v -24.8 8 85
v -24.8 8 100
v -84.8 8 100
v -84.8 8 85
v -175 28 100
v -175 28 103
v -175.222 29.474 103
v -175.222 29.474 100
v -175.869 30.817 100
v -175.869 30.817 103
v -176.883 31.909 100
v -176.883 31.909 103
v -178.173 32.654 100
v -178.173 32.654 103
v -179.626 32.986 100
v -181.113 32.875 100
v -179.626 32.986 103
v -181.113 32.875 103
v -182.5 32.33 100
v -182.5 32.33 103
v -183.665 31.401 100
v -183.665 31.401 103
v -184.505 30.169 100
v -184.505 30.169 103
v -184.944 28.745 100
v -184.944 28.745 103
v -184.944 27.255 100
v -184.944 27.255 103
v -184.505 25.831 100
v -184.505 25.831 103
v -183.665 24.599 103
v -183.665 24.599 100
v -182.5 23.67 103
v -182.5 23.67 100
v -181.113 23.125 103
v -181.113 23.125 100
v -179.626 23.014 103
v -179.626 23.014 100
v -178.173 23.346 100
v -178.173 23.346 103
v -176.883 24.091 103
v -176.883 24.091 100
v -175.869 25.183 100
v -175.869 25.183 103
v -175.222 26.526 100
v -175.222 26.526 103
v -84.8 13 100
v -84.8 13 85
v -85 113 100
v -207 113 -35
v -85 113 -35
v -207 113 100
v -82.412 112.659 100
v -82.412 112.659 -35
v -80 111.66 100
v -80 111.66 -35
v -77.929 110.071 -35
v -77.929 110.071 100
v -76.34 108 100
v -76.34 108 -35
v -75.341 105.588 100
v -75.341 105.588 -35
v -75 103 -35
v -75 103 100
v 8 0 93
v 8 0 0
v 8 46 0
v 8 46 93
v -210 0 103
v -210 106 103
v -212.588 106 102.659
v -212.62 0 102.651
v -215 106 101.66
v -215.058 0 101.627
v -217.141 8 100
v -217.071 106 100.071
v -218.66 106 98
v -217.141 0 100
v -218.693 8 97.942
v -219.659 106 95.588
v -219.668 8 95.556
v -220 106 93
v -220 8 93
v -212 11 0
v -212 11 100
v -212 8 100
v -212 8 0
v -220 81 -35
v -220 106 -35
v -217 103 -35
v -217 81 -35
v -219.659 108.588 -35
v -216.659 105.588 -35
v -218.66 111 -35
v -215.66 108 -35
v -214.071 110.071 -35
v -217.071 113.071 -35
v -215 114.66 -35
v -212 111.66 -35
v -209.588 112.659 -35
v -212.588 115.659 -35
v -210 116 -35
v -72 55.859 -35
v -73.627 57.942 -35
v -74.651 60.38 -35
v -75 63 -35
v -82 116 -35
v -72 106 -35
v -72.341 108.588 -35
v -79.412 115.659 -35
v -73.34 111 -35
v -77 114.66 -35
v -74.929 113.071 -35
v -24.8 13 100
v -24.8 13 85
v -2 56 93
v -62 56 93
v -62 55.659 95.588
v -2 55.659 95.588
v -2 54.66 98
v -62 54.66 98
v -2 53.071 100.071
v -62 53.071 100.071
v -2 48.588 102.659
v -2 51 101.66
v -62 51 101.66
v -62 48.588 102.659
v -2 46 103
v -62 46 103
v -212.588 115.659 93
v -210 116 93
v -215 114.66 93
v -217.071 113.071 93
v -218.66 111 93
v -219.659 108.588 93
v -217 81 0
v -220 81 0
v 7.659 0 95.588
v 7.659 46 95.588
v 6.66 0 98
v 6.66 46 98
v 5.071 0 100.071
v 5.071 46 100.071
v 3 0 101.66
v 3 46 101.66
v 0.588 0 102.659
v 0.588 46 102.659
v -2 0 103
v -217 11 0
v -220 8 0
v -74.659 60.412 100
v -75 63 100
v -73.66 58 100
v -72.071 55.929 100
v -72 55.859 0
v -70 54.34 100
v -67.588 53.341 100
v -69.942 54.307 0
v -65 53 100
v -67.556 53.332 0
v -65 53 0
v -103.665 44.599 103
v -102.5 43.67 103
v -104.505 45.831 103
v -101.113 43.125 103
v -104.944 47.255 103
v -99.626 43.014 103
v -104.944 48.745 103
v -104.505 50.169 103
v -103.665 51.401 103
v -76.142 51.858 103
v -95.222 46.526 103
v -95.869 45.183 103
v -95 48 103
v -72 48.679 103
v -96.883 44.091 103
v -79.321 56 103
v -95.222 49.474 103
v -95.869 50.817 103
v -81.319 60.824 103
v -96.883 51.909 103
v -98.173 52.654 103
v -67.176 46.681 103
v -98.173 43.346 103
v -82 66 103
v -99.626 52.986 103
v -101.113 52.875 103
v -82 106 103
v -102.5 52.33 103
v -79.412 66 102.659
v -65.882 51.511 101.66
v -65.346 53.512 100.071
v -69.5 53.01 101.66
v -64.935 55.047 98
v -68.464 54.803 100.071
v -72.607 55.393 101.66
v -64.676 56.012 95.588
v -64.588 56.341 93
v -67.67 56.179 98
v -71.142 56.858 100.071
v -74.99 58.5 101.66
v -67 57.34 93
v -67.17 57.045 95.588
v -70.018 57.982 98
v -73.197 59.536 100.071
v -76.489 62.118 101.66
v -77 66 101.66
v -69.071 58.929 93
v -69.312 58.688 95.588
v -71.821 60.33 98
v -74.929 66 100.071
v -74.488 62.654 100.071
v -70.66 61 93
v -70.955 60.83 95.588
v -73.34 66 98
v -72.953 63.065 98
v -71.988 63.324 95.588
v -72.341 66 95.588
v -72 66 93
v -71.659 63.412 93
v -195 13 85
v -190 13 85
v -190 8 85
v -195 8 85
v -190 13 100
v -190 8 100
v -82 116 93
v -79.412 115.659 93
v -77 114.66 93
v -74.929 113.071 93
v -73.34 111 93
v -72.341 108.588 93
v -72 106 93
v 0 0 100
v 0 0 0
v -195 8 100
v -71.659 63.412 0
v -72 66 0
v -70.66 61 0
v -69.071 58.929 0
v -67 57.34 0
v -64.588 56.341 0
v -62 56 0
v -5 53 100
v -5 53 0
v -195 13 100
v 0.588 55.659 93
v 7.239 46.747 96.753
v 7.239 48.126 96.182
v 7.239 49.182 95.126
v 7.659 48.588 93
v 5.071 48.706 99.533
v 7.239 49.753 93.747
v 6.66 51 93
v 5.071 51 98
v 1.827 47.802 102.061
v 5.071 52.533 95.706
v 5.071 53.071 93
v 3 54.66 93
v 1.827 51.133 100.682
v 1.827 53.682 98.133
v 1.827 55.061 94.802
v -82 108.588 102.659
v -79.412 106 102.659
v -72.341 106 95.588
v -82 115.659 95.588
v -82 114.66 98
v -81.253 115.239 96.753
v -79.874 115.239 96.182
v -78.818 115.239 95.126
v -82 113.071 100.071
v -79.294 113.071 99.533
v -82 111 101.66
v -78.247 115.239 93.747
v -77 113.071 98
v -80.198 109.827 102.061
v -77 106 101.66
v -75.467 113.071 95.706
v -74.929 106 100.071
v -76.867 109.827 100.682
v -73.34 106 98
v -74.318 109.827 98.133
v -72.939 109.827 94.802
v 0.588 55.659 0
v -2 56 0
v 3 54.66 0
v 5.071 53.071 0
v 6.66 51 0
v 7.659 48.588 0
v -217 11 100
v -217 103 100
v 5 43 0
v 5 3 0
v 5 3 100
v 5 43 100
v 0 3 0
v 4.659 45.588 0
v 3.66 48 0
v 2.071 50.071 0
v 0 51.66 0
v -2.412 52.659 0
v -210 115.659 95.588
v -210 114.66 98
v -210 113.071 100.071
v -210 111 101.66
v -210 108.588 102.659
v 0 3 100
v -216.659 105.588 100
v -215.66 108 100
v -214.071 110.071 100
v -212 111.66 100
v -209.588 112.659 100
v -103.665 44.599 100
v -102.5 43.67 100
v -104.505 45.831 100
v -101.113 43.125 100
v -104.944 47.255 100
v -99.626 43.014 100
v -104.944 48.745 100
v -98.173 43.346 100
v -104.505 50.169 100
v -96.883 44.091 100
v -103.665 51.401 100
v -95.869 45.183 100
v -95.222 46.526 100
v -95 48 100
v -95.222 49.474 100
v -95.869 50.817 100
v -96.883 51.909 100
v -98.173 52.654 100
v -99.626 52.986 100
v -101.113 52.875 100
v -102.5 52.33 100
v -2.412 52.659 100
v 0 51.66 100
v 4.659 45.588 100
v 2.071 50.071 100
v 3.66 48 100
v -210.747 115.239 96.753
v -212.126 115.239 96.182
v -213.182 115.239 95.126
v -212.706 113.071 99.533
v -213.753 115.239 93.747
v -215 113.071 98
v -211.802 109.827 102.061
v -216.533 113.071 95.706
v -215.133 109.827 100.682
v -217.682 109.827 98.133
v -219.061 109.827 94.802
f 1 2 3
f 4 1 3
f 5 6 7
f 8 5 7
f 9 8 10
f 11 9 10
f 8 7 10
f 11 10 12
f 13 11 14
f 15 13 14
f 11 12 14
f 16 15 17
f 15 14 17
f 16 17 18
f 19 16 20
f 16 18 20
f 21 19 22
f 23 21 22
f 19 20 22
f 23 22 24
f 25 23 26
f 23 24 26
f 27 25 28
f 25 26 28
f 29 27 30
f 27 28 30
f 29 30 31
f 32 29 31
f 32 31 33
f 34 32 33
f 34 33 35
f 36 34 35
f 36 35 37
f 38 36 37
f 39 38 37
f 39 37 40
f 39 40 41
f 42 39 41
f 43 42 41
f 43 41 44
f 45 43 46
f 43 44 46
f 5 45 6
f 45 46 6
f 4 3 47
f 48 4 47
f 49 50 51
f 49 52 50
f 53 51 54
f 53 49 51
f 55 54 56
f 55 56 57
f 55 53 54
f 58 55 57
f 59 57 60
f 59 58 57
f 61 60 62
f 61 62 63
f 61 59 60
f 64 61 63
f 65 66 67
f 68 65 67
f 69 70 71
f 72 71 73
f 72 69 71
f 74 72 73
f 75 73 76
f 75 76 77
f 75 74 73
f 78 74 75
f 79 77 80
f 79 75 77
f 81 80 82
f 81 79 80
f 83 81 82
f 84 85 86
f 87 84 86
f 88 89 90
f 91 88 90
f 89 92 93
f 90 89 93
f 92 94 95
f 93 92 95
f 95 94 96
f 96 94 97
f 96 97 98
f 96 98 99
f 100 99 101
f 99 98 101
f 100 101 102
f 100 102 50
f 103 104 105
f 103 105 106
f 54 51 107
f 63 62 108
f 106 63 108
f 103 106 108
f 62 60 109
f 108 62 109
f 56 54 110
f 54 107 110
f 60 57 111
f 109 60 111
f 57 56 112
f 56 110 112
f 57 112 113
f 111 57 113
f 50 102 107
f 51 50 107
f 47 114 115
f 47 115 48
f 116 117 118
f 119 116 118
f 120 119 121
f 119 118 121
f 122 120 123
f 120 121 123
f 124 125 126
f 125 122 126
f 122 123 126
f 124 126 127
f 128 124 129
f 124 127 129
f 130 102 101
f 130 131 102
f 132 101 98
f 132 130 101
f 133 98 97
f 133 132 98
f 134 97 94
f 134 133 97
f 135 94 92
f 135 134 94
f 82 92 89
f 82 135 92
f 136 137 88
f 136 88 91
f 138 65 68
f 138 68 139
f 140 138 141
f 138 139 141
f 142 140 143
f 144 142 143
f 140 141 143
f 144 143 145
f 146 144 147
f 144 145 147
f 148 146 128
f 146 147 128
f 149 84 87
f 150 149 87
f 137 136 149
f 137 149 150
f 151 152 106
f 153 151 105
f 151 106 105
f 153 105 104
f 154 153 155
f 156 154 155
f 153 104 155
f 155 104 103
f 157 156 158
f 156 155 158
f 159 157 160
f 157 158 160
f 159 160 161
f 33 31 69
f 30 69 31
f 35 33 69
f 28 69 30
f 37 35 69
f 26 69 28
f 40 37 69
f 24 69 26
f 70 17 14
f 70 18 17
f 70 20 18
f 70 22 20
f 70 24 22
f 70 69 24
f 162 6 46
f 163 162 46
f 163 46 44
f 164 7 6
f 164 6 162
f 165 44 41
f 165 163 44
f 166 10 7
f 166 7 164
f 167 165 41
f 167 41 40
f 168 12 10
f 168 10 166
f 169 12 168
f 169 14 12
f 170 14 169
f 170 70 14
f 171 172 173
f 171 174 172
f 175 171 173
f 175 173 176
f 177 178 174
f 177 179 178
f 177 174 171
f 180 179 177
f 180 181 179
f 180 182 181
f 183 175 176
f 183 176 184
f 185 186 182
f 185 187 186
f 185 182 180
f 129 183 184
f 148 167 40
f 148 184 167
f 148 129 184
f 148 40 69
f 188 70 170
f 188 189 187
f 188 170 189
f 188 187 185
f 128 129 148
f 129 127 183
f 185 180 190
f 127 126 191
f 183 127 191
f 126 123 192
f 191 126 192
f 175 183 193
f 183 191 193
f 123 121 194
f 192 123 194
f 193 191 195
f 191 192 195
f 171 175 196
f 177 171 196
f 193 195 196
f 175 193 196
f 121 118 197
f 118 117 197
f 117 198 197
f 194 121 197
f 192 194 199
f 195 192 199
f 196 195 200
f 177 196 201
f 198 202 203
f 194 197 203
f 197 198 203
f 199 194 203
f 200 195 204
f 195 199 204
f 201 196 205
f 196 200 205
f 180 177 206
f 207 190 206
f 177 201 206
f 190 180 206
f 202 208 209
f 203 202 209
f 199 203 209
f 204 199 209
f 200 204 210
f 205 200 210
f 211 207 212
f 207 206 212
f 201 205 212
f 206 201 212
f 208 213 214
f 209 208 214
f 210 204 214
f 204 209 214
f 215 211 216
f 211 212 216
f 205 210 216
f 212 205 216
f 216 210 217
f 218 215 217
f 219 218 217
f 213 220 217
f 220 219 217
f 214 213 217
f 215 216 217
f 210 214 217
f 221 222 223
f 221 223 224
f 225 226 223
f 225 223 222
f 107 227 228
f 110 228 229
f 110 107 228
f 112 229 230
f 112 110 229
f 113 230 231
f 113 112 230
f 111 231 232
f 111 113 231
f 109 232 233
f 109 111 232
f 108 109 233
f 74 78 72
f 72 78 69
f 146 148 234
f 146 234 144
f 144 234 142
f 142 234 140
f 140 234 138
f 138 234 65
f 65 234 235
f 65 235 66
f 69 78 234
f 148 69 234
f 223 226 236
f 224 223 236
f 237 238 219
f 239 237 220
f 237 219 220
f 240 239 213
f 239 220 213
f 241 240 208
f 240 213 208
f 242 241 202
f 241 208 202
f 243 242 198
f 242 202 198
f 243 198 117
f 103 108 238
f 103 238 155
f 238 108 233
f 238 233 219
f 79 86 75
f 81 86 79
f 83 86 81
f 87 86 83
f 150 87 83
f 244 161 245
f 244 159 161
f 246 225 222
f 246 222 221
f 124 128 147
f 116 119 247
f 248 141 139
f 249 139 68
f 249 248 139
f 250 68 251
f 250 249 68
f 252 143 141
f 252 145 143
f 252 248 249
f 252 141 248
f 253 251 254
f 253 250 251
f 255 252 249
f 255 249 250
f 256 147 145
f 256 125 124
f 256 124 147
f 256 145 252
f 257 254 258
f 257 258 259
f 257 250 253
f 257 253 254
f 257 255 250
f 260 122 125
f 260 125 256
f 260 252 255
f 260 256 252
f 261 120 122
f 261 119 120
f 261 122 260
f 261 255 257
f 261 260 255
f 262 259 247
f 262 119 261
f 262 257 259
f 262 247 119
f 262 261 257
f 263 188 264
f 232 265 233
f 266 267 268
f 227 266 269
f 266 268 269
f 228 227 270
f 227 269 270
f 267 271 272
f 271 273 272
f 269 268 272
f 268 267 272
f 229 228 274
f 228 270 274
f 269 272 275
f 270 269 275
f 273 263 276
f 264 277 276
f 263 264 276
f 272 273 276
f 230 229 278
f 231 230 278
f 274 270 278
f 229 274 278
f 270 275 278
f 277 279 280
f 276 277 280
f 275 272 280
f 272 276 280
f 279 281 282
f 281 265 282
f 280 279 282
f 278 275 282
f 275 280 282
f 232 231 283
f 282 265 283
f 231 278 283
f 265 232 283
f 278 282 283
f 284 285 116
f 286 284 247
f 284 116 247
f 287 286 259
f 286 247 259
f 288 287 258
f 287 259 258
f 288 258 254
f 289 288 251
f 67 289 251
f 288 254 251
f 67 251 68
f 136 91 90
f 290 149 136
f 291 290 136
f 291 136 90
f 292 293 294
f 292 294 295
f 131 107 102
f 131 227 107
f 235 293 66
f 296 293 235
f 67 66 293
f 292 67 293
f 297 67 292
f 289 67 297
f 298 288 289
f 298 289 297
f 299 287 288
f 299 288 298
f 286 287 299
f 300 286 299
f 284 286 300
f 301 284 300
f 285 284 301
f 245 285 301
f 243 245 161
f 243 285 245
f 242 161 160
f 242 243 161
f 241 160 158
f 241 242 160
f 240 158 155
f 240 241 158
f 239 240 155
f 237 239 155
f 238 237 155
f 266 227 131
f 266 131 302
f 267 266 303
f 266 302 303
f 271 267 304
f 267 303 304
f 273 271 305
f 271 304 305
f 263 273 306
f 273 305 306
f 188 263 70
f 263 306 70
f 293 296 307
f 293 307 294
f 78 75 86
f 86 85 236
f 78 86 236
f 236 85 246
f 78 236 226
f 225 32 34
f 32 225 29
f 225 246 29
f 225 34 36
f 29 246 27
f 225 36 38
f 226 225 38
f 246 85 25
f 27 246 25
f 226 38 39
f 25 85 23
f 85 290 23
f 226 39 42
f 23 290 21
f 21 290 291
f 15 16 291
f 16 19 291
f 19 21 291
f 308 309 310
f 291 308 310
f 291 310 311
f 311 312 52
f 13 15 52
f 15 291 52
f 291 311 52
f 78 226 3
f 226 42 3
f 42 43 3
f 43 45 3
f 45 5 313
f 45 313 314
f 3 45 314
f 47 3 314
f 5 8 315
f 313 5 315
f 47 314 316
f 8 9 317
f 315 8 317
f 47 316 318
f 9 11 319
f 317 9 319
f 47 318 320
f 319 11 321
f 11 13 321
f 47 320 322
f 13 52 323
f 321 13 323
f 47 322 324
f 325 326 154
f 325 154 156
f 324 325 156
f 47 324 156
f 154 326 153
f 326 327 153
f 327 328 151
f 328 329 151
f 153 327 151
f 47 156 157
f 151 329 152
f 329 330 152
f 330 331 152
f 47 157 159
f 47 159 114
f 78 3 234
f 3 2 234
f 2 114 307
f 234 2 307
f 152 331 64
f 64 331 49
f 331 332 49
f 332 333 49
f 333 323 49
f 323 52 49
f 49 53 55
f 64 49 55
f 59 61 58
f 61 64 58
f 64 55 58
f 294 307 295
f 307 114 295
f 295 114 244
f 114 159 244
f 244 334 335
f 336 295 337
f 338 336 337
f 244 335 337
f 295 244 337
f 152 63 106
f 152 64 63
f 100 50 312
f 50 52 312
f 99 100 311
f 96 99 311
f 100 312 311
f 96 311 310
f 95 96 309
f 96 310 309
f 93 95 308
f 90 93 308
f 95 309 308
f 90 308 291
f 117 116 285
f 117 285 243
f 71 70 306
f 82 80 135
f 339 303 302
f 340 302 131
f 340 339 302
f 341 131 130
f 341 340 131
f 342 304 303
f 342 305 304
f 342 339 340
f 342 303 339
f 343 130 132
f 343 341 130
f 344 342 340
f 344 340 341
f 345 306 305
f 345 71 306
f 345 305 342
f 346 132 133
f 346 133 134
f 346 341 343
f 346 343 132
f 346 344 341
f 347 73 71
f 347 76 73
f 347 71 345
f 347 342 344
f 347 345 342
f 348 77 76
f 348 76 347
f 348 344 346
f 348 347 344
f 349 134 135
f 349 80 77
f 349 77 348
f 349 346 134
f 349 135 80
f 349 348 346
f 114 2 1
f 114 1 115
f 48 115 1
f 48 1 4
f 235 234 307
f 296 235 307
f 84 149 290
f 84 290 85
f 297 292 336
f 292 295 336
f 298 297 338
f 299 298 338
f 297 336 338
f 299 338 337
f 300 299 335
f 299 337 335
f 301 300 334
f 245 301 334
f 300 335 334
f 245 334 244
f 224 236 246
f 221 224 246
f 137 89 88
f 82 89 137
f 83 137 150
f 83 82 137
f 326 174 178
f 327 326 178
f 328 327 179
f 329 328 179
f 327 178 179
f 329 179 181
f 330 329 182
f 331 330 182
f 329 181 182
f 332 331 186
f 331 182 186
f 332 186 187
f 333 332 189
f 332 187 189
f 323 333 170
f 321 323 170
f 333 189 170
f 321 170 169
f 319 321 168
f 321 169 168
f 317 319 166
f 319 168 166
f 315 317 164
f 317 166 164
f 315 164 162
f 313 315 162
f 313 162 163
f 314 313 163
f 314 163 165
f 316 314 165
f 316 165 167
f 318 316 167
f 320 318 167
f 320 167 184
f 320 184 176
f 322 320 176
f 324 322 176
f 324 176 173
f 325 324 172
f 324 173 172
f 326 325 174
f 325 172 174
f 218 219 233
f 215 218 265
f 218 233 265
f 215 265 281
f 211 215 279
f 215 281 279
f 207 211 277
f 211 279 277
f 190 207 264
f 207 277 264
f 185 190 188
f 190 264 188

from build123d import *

# Parameters (mm, degrees)
BOSS_EXTRUDE1_DEPTH = 100
BOSS_EXTRUDE2_DEPTH = 3
SKETCH3_R           = 5
CUT_EXTRUDE1_DEPTH  = 3
SKETCH4_W           = 5
SKETCH4_H           = 5
SKETCH4_W_2         = 60
BOSS_EXTRUDE3_DEPTH = 15
BOSS_EXTRUDE4_DEPTH = 35
FILLET2_R           = 10


with BuildPart() as part:
    # Sketch1 → Boss-Extrude1 (new body)
    with BuildSketch(Plane.XY):
        Polygon((-212, 8), (-220, 8), (-220, 116), (-72, 116), (-72, 56), (8, 56), (8, 0), (0, 0), (0, 3), (5, 3), (5, 53), (-75, 53), (-75, 113), (-217, 113), (-217, 11), (-212, 11), align=None)
    extrude(amount=BOSS_EXTRUDE1_DEPTH)

    # Sketch2 → Boss-Extrude2 (add)
    with BuildSketch(Plane.XY.offset(100)):
        Polygon((0, 0), (8, 0), (8, 56), (-72, 56), (-72, 116), (-220, 116), (-220, 8), (-220, 0), align=None)
    extrude(amount=BOSS_EXTRUDE2_DEPTH)

    # Sketch3 → Cut-Extrude1 (cut)
    with BuildSketch(Plane.XY.offset(103)):
        with Locations((-180, 28)):
            Circle(SKETCH3_R)
        with Locations((-100, 48)):
            Circle(SKETCH3_R)
    extrude(amount=-CUT_EXTRUDE1_DEPTH, mode=Mode.SUBTRACT)

    # Sketch4 → Boss-Extrude3 (add)
    with BuildSketch(Plane(origin=(0, 0, 100), x_dir=(-1, 0, 0), z_dir=(0, 0, -1))):
        with Locations((192.5, 10.5)):
            Rectangle(SKETCH4_W, SKETCH4_H)
        with Locations((54.8, 10.5)):
            Rectangle(SKETCH4_W_2, SKETCH4_H)
    extrude(amount=BOSS_EXTRUDE3_DEPTH)

    # Sketch5 → Boss-Extrude4 (add)
    with BuildSketch(Plane(origin=(0, 0, 0), x_dir=(-1, 0, 0), z_dir=(0, 0, -1))):
        Polygon((72, 116), (220, 116), (220, 81), (217, 81), (217, 113), (75, 113), (75, 53), (72, 53), (72, 56), align=None)
    extrude(amount=BOSS_EXTRUDE4_DEPTH)

    # Fillet2
    fillet2_edges = [part.edges().sort_by_distance(p)[0] for p in [
        (-32, 56, 103),
        (-220, 58, 103),
        (8, 28, 103),
        (-72, 86, 103),
        (-146, 116, 103),
        (-220, 116, 34),
        (-217, 113, 32.5),
        (5, 53, 50),
        (8, 56, 51.5),
        (-75, 53, 32.5),
        (-75, 113, 32.5),
        (-72, 56, 51.5),
        (-72, 116, 34),
    ]]
    fillet(fillet2_edges, radius=FILLET2_R)


solid = part.part
